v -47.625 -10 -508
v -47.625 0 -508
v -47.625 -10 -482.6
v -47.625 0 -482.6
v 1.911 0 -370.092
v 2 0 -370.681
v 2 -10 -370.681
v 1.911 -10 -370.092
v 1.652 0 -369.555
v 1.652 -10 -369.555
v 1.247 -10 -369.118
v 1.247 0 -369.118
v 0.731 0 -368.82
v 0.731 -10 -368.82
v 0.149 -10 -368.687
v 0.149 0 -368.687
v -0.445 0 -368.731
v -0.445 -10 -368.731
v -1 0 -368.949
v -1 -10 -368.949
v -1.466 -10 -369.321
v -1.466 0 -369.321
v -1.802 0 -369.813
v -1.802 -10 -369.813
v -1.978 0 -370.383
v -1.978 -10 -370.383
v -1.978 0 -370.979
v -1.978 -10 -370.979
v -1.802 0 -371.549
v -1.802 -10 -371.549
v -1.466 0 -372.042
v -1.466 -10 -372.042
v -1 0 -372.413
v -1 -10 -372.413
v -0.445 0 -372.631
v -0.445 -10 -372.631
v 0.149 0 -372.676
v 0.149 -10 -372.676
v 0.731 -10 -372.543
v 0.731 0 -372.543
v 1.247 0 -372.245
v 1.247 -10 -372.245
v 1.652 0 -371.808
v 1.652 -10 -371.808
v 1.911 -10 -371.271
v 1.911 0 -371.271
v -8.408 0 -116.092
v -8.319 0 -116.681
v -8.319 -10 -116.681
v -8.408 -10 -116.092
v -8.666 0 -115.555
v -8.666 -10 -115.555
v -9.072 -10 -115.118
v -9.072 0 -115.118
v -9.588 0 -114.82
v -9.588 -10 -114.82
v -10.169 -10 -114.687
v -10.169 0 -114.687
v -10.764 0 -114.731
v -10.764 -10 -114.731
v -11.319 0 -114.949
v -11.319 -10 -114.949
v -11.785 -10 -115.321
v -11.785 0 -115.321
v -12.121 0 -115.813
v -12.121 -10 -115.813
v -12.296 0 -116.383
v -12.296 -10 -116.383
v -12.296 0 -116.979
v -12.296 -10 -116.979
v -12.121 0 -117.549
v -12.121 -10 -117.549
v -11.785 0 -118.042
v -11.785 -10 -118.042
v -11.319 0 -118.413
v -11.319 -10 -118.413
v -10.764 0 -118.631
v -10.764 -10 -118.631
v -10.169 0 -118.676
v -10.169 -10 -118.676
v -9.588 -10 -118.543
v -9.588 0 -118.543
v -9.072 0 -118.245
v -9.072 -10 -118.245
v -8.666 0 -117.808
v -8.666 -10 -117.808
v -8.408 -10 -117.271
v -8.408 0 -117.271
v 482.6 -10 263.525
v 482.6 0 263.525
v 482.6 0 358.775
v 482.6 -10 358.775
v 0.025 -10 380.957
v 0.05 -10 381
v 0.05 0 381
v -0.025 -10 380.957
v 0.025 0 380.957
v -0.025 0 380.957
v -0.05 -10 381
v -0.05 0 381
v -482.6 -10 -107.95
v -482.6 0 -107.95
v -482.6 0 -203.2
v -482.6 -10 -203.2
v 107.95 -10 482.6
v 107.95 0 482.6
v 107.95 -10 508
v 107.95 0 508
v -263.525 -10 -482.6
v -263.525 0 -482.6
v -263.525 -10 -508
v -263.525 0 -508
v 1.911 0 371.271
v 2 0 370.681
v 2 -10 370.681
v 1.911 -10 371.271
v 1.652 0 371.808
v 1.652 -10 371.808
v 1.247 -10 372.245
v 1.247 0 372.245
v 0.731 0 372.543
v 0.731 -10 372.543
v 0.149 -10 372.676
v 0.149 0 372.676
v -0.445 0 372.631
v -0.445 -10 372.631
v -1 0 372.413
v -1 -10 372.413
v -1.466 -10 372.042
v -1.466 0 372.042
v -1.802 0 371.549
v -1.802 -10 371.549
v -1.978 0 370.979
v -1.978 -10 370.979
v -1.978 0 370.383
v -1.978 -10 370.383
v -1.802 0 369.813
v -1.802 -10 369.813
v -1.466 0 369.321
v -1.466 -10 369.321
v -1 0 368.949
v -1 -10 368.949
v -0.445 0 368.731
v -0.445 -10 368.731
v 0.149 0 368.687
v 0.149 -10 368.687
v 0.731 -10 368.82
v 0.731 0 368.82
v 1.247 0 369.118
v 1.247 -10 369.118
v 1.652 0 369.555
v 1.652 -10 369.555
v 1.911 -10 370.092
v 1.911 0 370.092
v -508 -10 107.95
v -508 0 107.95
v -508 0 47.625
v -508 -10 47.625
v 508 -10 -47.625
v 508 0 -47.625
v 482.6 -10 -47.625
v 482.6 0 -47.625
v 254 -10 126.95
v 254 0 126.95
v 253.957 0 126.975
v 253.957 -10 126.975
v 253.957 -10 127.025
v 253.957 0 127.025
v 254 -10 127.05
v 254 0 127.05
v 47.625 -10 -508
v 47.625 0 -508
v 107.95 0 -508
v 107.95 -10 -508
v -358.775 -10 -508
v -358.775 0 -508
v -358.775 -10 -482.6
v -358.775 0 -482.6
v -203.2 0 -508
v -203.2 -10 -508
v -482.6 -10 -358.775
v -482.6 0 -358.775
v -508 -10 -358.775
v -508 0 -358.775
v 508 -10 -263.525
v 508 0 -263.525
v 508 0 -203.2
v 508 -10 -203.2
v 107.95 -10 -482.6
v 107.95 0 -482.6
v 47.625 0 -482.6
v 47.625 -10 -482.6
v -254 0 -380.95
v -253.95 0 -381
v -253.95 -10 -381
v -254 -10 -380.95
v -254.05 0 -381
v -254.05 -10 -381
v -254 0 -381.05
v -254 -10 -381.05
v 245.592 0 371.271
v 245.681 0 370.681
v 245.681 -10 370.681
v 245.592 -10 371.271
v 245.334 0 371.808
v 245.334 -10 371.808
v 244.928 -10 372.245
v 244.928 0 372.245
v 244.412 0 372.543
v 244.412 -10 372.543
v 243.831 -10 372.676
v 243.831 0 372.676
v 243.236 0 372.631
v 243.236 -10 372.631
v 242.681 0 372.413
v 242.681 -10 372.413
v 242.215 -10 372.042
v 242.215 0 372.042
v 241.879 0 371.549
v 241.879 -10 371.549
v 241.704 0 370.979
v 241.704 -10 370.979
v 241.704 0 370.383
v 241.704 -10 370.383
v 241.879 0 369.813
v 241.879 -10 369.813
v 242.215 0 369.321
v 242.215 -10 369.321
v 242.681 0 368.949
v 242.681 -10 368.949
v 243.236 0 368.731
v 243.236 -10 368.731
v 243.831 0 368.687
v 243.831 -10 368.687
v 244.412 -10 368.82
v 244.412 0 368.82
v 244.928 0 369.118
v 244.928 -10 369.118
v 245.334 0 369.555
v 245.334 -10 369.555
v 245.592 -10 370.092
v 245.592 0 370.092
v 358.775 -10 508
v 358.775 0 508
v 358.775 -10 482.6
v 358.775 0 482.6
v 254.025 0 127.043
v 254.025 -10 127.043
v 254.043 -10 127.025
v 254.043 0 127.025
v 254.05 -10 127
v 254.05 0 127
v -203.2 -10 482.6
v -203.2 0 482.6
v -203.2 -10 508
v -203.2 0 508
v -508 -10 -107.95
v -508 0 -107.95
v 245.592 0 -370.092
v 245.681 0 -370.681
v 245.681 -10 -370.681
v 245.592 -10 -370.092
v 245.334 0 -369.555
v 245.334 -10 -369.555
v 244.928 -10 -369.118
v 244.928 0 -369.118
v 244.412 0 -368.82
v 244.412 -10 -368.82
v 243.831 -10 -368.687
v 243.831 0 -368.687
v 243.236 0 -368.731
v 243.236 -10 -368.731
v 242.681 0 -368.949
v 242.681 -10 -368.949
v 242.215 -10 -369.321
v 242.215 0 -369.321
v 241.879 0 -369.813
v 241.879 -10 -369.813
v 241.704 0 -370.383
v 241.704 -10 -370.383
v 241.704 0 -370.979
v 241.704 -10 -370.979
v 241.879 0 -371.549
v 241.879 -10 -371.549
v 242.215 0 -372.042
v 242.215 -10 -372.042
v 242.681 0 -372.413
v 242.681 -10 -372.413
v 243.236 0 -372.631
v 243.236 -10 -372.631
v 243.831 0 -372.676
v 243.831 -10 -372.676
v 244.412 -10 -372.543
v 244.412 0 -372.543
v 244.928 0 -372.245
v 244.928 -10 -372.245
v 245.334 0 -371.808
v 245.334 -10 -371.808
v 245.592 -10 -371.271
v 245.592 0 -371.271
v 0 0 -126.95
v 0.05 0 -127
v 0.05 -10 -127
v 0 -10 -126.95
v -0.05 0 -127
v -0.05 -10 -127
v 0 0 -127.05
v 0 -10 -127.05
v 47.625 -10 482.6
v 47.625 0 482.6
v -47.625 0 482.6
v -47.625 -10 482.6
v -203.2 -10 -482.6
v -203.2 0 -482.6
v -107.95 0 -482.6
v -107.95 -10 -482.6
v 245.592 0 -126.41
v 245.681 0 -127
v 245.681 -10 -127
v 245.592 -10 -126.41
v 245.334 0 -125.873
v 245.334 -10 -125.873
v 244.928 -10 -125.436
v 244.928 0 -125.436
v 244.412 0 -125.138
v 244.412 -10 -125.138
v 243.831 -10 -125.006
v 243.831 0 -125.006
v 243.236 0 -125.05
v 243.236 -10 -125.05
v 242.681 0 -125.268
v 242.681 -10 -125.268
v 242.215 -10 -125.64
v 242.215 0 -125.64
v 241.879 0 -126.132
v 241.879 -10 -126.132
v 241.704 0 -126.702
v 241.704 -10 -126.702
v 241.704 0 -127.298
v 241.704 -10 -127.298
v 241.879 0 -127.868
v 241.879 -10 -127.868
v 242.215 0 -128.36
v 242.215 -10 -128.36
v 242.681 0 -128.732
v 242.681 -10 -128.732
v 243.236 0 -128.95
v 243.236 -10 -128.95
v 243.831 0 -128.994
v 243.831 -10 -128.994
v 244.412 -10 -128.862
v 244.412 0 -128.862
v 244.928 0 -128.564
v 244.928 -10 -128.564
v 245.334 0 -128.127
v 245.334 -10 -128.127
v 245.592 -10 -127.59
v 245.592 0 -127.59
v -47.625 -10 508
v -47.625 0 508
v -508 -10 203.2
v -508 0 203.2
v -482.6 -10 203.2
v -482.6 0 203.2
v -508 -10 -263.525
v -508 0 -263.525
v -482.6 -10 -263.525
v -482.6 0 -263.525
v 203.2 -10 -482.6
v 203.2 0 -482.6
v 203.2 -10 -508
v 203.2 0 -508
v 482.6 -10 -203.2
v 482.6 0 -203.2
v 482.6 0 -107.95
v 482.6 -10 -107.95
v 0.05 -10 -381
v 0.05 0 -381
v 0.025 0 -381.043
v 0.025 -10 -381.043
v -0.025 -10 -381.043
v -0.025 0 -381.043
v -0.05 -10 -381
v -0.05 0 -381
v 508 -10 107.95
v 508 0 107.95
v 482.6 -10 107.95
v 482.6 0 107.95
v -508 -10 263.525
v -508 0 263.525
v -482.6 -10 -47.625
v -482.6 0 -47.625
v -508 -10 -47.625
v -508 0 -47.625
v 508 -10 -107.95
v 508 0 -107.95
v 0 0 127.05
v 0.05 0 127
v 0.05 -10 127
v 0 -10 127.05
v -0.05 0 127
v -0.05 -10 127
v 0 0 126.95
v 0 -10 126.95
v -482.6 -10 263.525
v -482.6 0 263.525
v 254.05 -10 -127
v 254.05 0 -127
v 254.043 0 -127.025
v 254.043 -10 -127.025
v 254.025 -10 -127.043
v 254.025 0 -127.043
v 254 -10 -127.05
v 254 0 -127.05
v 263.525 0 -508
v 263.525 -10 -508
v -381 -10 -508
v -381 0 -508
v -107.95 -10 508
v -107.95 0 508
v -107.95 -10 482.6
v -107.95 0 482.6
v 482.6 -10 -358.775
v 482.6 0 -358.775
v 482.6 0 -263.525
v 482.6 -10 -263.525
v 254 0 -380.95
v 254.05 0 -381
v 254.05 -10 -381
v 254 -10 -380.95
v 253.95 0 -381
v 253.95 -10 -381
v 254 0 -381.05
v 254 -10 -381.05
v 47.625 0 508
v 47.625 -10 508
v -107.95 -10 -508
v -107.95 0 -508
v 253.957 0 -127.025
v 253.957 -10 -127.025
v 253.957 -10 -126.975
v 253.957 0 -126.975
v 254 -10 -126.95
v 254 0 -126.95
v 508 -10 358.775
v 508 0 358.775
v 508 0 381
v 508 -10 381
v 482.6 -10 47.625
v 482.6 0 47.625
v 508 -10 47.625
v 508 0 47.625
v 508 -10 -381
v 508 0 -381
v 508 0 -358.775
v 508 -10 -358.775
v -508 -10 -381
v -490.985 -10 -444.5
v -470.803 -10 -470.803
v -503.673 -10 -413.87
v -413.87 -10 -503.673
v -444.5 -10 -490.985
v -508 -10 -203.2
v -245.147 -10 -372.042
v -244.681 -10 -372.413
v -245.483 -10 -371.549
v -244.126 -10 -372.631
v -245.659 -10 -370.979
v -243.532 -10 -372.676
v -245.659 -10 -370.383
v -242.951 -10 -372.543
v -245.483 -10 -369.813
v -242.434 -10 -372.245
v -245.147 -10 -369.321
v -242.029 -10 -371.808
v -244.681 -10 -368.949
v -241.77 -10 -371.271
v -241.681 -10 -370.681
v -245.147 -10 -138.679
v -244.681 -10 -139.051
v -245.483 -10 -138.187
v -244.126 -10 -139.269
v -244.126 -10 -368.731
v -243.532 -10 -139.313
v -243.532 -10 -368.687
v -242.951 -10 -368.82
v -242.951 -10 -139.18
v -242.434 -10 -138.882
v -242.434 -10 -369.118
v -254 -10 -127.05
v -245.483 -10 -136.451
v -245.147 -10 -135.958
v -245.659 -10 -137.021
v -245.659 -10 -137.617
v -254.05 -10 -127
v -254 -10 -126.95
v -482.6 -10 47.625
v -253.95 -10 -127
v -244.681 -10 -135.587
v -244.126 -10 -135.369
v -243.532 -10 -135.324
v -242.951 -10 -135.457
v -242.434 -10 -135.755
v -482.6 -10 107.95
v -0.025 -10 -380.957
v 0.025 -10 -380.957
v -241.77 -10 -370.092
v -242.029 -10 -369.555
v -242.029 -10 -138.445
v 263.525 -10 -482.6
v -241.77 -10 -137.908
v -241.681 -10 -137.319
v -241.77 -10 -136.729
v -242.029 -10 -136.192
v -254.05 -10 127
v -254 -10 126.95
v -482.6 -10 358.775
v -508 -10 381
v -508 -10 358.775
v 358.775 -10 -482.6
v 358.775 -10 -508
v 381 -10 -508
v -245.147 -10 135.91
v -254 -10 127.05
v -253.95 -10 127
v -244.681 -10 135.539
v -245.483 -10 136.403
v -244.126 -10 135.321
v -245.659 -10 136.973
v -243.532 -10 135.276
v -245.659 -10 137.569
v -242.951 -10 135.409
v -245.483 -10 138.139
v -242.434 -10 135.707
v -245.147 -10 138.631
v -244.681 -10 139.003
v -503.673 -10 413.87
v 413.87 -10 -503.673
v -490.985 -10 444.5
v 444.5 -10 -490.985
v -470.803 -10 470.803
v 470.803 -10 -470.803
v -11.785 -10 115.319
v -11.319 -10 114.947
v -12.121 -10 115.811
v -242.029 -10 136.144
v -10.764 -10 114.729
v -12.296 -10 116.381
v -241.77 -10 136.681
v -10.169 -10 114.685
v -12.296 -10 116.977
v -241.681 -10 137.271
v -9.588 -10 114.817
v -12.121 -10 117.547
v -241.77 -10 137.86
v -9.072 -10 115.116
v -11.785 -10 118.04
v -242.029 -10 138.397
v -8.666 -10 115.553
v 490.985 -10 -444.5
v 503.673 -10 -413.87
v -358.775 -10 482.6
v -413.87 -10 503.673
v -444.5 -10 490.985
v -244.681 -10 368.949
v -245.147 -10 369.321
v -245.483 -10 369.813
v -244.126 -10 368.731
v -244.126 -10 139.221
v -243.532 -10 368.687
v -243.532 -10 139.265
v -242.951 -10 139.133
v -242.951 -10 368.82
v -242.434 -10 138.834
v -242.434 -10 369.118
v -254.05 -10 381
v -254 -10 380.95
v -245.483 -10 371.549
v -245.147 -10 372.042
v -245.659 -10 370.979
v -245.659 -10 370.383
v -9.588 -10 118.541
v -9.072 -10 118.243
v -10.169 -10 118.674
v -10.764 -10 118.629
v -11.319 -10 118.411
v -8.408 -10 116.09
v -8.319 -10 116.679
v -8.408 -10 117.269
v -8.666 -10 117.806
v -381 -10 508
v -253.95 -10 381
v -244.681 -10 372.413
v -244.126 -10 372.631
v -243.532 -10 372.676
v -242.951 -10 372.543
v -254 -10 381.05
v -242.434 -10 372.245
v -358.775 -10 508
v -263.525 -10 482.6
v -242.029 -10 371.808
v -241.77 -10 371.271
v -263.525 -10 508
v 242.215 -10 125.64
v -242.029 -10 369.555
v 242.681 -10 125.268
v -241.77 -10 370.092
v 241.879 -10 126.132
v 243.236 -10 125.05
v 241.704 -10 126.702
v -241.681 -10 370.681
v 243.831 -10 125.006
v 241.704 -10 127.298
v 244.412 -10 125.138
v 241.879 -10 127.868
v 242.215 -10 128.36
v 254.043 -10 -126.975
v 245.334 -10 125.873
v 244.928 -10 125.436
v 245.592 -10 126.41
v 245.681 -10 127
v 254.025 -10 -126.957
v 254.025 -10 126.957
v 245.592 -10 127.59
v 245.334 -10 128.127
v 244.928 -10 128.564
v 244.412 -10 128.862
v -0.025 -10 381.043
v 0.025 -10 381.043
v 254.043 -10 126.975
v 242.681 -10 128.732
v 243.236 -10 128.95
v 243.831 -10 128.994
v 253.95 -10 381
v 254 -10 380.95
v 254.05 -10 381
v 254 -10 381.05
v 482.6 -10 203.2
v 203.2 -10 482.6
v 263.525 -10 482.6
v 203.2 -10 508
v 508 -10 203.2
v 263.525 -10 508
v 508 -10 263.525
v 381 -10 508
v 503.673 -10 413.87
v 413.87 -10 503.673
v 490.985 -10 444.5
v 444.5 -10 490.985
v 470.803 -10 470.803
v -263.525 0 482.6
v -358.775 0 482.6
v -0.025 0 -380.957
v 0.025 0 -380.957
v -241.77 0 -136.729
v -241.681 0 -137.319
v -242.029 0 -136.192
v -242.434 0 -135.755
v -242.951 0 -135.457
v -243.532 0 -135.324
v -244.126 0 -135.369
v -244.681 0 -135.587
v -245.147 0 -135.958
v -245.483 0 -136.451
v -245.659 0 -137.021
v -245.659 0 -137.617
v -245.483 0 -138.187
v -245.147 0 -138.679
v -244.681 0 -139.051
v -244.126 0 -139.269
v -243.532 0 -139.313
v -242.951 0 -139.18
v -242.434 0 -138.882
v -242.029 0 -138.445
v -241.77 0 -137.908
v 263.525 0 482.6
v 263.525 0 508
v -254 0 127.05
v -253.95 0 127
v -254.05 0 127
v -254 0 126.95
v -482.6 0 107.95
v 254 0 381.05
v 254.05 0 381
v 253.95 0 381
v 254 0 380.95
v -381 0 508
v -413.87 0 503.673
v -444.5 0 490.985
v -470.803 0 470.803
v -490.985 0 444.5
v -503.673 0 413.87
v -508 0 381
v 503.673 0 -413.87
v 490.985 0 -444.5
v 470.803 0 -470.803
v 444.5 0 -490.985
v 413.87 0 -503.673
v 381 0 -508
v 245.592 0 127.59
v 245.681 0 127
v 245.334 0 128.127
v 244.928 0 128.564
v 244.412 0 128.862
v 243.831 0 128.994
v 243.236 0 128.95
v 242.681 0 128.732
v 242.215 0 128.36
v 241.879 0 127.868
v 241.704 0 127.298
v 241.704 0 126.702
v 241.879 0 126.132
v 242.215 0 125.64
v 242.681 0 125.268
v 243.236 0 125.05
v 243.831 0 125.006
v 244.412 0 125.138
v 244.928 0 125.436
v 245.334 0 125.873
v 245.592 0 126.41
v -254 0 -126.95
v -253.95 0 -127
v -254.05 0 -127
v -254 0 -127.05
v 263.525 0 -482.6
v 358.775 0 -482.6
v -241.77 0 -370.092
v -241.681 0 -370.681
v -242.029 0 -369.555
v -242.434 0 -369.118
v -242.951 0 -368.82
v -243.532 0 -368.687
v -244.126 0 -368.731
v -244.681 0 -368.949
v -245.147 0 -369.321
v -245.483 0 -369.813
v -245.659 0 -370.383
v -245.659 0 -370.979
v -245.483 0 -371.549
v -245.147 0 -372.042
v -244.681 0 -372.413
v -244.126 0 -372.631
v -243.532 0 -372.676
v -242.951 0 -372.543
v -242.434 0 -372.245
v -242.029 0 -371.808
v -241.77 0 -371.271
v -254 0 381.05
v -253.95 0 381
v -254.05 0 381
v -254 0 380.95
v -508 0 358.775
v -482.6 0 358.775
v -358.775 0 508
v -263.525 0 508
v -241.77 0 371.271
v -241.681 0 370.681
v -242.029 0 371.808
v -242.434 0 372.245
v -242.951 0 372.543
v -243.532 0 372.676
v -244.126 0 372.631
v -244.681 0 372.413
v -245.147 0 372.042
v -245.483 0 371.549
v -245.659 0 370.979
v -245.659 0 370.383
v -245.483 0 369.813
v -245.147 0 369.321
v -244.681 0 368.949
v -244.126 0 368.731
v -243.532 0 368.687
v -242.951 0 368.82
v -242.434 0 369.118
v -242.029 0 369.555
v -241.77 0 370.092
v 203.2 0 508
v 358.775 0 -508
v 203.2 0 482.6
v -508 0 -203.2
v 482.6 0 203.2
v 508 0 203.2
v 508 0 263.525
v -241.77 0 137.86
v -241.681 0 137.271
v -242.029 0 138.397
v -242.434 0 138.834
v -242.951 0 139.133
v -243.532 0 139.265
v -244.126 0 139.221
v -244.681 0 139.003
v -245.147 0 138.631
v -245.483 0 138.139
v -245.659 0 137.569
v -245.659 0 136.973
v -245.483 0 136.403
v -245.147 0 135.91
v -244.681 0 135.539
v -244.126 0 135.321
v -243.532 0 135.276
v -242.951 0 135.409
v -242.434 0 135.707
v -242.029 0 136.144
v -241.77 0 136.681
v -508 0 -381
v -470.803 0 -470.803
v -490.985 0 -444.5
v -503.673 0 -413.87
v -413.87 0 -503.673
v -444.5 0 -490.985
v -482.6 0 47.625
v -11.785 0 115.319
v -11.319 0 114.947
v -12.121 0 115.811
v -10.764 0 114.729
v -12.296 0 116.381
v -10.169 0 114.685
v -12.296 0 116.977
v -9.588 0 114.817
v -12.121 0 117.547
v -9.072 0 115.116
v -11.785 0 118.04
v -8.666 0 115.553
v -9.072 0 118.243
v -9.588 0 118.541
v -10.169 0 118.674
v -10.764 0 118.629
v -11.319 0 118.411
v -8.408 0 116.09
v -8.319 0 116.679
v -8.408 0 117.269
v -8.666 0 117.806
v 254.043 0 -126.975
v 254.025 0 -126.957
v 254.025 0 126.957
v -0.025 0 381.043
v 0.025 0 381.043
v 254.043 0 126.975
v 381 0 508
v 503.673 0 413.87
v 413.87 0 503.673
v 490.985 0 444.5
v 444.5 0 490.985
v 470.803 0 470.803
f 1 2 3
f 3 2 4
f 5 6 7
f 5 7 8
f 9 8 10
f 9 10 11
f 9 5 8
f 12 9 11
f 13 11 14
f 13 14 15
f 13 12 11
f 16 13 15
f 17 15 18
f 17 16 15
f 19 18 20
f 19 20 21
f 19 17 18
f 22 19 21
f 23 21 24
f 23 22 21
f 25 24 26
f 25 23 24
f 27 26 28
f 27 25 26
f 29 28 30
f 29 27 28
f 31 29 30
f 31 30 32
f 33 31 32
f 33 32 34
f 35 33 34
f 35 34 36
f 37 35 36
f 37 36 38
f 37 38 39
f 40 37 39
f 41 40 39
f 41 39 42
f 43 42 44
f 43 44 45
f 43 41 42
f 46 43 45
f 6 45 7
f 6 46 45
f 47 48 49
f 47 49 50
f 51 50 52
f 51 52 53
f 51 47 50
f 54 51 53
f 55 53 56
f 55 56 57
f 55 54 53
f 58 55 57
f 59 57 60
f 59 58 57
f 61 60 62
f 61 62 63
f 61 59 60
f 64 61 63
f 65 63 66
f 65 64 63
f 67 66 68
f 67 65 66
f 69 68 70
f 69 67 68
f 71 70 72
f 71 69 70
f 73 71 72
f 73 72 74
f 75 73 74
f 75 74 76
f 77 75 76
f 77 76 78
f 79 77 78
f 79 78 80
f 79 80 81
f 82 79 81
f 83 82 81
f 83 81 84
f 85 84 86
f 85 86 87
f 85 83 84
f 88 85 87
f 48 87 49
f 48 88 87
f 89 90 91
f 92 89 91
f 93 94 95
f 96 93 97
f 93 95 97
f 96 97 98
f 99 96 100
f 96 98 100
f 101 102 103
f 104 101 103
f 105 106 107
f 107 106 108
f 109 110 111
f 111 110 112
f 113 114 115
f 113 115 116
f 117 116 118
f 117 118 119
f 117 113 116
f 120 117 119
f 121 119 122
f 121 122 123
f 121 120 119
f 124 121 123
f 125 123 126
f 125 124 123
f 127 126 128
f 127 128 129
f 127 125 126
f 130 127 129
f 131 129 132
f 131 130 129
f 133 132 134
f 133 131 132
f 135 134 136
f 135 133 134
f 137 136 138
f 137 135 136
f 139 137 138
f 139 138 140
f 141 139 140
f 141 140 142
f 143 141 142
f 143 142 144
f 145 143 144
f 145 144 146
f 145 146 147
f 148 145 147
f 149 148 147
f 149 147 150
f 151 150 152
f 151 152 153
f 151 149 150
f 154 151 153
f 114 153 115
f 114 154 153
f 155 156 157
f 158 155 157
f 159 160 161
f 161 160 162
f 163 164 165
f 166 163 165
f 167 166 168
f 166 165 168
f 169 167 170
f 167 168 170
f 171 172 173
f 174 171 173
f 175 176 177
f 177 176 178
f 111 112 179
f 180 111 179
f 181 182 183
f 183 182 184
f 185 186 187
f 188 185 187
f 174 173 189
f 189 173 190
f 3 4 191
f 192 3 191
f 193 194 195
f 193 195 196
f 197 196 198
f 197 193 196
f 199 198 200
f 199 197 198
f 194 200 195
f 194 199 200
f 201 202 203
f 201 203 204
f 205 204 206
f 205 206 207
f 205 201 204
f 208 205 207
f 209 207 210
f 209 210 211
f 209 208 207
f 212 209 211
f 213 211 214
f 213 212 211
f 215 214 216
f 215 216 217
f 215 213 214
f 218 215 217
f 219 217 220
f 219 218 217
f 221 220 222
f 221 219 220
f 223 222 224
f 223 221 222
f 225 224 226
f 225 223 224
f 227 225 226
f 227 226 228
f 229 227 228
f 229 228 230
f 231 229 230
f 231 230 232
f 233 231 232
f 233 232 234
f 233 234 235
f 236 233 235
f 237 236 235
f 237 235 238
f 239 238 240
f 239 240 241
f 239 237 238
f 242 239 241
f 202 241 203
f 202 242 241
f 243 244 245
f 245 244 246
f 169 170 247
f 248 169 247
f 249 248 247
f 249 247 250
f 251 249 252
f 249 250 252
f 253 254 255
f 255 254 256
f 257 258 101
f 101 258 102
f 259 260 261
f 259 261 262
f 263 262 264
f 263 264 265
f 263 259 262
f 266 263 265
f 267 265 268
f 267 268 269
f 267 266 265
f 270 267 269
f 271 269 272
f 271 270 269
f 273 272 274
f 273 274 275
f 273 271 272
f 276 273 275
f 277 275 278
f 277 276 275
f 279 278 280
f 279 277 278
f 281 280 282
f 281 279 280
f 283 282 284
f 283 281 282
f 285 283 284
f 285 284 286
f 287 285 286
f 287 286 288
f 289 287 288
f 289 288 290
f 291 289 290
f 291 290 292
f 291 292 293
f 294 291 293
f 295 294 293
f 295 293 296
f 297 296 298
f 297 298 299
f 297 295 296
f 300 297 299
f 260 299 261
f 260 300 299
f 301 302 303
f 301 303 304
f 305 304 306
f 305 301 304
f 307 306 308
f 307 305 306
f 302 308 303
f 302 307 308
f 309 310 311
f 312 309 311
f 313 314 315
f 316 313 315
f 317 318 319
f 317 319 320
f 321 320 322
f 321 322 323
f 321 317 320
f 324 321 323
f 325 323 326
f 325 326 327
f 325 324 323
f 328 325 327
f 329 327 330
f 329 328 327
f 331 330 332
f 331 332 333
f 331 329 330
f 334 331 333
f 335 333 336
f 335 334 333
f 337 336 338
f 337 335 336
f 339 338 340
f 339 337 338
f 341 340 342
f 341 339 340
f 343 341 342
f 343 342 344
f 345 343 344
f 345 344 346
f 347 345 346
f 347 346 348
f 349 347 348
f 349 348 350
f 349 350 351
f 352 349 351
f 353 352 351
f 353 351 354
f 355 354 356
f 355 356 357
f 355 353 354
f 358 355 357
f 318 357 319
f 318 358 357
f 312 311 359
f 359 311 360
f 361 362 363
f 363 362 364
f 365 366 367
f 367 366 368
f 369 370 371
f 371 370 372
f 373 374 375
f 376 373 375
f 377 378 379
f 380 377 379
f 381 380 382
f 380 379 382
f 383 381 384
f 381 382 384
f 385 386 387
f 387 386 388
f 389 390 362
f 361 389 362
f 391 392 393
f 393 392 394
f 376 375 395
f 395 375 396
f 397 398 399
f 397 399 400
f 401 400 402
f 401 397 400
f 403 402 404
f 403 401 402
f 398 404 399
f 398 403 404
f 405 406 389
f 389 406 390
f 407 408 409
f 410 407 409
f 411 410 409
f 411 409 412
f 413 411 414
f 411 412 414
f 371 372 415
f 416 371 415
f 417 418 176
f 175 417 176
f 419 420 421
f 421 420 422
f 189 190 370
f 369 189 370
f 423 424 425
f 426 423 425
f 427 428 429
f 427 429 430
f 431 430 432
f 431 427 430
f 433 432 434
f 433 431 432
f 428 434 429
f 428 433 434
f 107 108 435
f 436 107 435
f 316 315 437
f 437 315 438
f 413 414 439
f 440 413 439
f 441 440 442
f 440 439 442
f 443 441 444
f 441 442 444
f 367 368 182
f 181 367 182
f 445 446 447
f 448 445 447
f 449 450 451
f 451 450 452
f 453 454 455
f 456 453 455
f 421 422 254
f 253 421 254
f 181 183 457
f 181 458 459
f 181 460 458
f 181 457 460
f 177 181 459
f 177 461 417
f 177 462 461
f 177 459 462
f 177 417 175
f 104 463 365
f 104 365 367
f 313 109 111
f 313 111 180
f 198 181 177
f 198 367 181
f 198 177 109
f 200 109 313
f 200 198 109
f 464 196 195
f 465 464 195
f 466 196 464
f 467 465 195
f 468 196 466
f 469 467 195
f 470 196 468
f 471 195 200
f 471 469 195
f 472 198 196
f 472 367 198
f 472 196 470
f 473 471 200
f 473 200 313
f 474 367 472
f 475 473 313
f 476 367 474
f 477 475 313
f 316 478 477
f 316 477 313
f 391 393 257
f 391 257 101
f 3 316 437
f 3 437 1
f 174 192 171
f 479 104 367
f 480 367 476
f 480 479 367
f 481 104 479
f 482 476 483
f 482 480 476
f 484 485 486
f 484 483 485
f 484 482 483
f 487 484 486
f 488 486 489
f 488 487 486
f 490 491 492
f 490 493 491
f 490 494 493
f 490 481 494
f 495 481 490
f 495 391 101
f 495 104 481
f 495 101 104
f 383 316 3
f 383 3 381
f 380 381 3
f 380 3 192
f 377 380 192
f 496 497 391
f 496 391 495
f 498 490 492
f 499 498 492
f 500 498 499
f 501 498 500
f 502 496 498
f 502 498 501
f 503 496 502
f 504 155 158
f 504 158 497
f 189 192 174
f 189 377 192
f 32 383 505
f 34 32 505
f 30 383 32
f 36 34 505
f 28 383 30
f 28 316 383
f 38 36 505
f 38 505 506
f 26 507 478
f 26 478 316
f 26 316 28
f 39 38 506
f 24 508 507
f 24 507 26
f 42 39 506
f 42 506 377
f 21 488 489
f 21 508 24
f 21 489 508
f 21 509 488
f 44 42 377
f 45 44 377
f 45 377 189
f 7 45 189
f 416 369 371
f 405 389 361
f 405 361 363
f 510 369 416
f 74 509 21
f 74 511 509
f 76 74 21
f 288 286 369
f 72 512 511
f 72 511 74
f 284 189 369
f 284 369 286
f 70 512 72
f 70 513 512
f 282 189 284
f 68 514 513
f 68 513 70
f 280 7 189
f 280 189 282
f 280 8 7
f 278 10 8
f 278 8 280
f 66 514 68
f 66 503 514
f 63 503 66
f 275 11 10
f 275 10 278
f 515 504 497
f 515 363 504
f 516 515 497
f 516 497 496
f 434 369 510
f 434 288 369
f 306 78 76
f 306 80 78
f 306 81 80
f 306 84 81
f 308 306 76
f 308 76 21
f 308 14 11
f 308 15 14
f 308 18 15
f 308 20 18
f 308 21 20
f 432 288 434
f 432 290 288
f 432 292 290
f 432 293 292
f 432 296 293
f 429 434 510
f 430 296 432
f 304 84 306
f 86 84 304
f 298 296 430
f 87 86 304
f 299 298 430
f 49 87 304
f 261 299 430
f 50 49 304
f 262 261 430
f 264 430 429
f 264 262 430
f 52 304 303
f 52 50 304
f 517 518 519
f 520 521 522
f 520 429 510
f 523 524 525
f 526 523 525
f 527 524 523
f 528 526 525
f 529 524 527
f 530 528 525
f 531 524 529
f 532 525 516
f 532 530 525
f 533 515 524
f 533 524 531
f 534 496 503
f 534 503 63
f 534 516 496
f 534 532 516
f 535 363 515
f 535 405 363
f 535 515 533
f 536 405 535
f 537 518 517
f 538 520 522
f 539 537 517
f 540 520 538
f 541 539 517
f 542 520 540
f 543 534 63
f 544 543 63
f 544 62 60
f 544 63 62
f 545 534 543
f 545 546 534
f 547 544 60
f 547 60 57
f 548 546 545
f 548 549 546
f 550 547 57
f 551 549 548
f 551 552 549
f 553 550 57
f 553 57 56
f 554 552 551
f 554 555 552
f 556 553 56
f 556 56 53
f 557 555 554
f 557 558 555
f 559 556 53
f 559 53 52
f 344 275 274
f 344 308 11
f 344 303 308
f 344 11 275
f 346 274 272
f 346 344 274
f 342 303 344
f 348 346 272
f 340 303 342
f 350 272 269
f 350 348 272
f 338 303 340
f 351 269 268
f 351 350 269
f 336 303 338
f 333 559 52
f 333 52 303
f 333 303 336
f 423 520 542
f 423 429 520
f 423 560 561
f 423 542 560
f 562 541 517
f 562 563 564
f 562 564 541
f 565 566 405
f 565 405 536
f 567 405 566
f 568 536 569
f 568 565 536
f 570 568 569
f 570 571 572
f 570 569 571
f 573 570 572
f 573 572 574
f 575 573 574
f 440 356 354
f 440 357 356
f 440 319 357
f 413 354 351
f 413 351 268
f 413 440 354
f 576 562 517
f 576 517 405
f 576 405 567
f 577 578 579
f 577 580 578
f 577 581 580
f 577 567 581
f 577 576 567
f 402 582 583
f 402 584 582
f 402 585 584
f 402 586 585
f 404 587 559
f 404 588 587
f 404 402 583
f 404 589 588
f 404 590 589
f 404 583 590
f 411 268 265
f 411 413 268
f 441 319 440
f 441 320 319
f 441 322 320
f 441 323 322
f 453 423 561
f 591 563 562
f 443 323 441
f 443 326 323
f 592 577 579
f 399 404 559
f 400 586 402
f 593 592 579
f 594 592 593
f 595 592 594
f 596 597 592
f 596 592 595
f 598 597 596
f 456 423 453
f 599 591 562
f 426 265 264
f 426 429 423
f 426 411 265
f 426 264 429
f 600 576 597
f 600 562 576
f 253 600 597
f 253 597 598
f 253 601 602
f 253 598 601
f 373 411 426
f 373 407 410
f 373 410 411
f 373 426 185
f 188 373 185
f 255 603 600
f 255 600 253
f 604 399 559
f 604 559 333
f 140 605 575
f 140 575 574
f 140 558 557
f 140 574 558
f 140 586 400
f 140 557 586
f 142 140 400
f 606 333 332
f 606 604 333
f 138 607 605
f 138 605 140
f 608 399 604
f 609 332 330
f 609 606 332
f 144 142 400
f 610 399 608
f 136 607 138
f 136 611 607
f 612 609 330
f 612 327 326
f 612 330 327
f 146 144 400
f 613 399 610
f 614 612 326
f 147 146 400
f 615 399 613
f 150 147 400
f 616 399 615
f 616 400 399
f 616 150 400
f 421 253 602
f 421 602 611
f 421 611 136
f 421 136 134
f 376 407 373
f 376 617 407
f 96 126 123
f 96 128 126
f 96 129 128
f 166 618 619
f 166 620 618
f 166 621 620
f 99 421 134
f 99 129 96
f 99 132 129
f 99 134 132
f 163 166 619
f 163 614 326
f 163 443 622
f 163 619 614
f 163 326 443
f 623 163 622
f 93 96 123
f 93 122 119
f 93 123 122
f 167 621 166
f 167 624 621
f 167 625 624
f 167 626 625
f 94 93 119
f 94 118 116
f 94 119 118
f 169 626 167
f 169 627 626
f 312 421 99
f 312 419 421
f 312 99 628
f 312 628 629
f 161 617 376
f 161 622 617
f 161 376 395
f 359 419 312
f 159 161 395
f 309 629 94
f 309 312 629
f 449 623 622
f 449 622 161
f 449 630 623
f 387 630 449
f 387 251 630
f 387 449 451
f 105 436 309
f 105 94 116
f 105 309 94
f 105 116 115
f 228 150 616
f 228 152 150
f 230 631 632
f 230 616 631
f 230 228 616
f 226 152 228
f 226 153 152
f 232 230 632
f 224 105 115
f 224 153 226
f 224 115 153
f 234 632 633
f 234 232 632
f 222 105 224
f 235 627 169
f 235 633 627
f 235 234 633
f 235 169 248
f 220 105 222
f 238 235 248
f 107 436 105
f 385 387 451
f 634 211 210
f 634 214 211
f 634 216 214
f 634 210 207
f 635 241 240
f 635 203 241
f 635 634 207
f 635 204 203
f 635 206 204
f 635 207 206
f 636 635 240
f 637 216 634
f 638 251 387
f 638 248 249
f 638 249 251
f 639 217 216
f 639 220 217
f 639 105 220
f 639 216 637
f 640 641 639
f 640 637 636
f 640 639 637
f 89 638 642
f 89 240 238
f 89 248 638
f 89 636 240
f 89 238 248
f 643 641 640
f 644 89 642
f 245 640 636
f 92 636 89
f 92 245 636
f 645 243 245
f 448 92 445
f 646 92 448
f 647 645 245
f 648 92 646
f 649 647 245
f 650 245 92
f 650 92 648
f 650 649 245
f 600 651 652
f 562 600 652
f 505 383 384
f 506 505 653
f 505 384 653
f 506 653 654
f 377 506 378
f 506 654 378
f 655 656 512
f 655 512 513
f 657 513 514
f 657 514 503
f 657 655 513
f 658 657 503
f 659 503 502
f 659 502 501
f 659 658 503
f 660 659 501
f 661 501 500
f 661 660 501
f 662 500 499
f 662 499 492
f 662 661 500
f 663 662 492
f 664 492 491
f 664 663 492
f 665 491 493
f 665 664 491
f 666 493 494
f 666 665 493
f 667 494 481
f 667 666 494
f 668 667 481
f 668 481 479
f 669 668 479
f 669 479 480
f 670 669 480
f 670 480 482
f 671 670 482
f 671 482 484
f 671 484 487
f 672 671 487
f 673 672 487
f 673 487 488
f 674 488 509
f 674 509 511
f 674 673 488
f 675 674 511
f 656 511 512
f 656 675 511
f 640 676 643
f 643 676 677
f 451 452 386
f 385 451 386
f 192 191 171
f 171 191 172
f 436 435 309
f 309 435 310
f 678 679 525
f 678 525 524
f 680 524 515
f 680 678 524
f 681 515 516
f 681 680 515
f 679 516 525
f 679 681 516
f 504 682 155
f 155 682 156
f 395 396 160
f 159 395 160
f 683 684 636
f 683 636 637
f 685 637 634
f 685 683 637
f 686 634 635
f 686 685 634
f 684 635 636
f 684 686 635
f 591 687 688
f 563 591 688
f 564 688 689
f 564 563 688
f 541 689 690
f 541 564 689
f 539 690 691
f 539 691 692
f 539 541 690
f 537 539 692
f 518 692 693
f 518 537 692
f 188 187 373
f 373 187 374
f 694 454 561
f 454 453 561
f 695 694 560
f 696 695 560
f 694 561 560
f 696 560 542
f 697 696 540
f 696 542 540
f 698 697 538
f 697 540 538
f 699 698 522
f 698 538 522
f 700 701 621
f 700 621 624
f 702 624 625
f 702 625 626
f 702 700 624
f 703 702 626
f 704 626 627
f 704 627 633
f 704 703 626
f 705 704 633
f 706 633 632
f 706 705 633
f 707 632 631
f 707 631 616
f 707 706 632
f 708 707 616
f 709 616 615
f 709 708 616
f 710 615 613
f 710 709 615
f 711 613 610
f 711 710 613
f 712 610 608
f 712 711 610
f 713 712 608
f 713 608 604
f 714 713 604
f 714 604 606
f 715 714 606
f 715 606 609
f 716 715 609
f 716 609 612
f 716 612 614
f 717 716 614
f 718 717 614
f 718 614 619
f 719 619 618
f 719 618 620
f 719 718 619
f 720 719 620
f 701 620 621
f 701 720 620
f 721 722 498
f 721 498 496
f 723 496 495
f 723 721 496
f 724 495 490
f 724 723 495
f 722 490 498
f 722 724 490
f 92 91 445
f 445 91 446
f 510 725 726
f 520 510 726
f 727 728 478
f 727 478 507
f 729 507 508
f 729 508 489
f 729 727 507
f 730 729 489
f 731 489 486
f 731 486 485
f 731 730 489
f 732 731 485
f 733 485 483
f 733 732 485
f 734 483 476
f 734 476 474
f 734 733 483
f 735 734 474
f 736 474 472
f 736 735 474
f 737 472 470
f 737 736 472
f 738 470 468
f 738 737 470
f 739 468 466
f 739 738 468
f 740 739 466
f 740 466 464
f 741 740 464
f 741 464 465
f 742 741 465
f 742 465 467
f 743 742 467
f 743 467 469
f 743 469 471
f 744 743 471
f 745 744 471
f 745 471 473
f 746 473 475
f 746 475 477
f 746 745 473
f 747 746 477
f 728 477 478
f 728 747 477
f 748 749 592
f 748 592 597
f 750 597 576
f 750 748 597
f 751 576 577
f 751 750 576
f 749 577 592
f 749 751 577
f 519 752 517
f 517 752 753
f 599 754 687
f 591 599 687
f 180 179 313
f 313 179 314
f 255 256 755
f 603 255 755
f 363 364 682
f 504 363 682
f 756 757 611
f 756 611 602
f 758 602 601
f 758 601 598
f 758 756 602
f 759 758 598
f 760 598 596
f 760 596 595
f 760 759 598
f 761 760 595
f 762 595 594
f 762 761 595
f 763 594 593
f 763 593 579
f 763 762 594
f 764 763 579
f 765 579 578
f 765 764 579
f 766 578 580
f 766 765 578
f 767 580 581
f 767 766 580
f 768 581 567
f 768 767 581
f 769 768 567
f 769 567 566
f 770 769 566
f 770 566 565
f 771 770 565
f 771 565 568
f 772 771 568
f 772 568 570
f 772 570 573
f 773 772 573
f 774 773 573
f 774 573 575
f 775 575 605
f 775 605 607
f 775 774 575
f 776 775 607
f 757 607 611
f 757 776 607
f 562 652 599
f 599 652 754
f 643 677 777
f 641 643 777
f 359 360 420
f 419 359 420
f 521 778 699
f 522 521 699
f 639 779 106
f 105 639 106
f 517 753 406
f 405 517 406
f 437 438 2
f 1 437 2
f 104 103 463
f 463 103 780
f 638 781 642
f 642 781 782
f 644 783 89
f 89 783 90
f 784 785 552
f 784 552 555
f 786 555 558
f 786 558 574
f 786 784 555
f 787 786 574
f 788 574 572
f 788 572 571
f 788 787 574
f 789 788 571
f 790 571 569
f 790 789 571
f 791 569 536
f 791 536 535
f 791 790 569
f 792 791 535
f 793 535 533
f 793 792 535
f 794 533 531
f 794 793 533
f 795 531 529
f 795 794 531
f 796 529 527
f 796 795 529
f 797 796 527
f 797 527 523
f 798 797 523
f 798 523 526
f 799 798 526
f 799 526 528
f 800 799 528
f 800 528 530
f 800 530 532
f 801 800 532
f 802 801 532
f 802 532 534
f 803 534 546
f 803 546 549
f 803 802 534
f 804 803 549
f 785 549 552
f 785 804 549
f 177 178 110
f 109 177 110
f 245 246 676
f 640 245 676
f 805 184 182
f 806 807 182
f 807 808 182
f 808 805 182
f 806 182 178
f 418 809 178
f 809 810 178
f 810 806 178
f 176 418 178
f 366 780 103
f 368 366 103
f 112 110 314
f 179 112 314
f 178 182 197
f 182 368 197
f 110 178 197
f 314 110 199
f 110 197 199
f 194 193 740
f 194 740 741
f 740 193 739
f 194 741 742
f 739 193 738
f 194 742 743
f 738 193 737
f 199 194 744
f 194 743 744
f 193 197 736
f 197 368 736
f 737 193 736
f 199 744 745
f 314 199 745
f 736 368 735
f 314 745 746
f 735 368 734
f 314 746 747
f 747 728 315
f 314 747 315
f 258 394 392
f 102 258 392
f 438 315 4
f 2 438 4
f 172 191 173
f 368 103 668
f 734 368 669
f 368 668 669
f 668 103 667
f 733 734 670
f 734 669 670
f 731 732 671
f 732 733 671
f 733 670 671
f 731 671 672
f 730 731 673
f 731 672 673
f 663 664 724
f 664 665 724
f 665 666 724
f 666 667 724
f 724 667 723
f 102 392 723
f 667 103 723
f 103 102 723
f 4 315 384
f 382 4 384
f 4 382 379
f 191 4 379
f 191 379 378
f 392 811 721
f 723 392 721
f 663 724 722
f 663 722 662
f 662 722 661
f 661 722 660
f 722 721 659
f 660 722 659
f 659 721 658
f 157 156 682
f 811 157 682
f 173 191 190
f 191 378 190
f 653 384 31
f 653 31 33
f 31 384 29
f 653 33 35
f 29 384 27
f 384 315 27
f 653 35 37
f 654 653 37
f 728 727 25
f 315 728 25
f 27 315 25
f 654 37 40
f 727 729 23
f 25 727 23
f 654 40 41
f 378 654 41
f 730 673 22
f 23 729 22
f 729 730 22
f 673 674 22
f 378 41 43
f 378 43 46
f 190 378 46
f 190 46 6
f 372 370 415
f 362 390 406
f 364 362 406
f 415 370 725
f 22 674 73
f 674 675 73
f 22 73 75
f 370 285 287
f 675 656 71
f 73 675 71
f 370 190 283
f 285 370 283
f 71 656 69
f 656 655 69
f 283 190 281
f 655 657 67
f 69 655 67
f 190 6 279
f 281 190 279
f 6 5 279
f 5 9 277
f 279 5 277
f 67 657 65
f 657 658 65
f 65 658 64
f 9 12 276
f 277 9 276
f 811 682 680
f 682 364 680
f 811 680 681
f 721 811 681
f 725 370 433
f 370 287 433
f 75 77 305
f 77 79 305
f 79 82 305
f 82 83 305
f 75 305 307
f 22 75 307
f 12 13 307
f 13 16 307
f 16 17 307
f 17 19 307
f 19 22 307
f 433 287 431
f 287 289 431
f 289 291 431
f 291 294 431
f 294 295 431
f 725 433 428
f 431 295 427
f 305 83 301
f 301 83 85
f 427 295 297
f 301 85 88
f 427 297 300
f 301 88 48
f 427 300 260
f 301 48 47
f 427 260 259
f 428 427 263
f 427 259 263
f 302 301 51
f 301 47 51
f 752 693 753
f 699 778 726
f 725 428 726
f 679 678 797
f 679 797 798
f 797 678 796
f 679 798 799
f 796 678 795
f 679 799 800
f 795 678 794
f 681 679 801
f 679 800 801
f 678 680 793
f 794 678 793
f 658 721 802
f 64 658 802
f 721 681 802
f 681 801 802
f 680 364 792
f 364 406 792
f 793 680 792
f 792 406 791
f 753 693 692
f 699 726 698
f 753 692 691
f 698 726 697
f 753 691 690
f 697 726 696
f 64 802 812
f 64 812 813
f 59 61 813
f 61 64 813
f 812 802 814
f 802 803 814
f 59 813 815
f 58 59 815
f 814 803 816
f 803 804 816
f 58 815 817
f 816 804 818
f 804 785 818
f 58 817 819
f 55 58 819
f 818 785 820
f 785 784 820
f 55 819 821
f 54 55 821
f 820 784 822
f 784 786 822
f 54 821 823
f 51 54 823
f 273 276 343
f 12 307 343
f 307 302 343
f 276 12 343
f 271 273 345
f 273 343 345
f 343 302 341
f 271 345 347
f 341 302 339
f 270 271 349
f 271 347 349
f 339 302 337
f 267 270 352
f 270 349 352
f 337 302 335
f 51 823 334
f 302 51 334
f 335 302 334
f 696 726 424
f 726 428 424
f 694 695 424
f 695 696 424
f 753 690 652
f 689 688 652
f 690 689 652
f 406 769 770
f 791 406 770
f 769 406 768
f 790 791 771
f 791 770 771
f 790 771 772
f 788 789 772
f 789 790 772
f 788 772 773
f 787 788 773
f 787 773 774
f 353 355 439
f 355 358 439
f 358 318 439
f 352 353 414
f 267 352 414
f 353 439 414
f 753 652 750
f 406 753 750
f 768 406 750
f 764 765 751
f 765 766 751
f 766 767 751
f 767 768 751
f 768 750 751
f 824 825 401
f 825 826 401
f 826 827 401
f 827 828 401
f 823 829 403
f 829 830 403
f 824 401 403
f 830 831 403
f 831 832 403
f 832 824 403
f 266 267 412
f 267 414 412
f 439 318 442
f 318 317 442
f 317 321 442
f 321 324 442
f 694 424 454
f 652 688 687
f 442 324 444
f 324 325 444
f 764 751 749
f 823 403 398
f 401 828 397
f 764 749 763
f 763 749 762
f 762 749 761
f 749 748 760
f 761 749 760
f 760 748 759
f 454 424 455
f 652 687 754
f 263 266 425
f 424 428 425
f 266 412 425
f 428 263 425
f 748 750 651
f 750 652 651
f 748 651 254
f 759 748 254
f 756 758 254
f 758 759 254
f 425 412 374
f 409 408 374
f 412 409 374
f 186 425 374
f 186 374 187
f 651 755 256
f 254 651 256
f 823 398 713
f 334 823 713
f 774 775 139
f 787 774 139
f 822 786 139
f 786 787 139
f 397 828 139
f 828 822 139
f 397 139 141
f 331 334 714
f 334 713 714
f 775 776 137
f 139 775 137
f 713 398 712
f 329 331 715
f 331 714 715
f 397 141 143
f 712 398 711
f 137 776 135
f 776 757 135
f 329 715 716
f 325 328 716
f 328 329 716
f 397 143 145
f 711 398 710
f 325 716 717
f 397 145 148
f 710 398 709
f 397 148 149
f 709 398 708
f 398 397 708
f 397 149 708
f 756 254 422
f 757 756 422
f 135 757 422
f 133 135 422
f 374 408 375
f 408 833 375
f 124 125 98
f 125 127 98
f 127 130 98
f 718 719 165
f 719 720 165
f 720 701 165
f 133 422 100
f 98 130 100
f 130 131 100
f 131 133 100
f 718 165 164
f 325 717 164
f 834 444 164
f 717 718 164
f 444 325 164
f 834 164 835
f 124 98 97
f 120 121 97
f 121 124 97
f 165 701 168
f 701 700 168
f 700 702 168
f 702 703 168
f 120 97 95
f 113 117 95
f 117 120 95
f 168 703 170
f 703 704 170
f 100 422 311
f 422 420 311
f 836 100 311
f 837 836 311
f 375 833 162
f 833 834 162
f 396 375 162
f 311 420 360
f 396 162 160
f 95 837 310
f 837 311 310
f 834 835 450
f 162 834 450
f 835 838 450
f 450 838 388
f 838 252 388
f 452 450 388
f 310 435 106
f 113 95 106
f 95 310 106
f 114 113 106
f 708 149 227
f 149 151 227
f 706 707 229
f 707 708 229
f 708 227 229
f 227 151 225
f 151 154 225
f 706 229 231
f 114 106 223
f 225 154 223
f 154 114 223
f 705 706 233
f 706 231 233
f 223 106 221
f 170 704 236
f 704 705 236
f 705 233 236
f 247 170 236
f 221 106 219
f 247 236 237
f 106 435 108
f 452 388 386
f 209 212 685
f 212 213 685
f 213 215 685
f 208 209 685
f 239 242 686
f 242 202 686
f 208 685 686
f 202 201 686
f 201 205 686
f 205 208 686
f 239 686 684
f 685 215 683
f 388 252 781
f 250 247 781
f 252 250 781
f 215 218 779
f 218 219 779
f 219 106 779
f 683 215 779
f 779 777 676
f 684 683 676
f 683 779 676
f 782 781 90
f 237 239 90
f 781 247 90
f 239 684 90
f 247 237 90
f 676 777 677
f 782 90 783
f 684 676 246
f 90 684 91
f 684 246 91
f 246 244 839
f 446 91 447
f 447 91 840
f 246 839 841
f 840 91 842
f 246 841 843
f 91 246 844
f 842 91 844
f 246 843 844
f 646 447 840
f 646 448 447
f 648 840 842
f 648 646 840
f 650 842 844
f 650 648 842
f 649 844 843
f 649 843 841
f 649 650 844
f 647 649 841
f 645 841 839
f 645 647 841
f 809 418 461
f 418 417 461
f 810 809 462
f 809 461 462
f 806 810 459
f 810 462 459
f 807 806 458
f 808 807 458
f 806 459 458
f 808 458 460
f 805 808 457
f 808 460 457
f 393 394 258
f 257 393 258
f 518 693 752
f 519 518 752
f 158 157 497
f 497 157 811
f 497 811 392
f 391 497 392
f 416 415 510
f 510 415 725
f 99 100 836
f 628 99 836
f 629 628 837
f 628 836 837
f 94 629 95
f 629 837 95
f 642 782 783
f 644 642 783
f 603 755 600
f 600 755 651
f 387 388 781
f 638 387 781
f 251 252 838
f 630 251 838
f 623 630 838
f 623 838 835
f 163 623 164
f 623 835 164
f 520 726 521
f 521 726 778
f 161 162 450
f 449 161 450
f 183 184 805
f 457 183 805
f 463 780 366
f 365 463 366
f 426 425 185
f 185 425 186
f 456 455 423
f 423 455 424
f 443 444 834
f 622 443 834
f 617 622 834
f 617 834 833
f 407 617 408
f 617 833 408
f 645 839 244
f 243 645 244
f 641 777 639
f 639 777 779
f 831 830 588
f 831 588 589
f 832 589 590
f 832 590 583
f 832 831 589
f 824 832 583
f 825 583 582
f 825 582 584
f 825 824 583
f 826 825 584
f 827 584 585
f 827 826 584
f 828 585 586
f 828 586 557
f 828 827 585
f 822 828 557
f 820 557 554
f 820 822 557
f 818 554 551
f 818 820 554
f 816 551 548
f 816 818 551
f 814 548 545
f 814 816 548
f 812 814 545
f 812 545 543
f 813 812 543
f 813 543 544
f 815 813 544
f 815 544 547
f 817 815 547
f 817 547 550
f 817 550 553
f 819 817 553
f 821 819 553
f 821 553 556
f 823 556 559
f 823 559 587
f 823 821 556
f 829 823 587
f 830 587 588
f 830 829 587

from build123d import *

# Parameters (mm, degrees)
F0_R     = 0.05
F0_R_2   = 10.31875
F0_R_3   = 2
F1_DEPTH = 10
F2_R     = 127


with BuildPart() as f1:
    # F0 (on Front) → F1 (new body)
    with BuildSketch(Plane.XZ):
        Polygon((508, 358.775), (508, 508), (358.775, 508), (358.775, 482.6), (263.525, 482.6), (263.525, 508), (203.2, 508), (203.2, 482.6), (107.95, 482.6), (107.95, 508), (47.625, 508), (47.625, 482.6), (-47.625, 482.6), (-47.625, 508), (-107.95, 508), (-107.95, 482.6), (-203.2, 482.6), (-203.2, 508), (-263.525, 508), (-263.525, 482.6), (-358.775, 482.6), (-358.775, 508), (-508, 508), (-508, 358.775), (-482.6, 358.775), (-482.6, 263.525), (-508, 263.525), (-508, 203.2), (-482.6, 203.2), (-482.6, 107.95), (-508, 107.95), (-508, 47.625), (-482.6, 47.625), (-482.6, -47.625), (-508, -47.625), (-508, -107.95), (-482.6, -107.95), (-482.6, -203.2), (-508, -203.2), (-508, -263.525), (-482.6, -263.525), (-482.6, -358.775), (-508, -358.775), (-508, -508), (-358.775, -508), (-358.775, -482.6), (-263.525, -482.6), (-263.525, -508), (-203.2, -508), (-203.2, -482.6), (-107.95, -482.6), (-107.95, -508), (-47.625, -508), (-47.625, -482.6), (47.625, -482.6), (47.625, -508), (107.95, -508), (107.95, -482.6), (203.2, -482.6), (203.2, -508), (263.525, -508), (263.525, -482.6), (358.775, -482.6), (358.775, -508), (508, -508), (508, -358.775), (482.6, -358.775), (482.6, -263.525), (508, -263.525), (508, -203.2), (482.6, -203.2), (482.6, -107.95), (508, -107.95), (508, -47.625), (482.6, -47.625), (482.6, 47.625), (508, 47.625), (508, 107.95), (482.6, 107.95), (482.6, 203.2), (508, 203.2), (508, 263.525), (482.6, 263.525), (482.6, 358.775), align=None)
        with Locations((-254, -381)):
            Circle(F0_R, mode=Mode.SUBTRACT)
        with Locations((-243.68125, -370.68125)):
            Circle(F0_R_2, mode=Mode.SUBTRACT)
        with Locations((-243.68125, -137.31875)):
            Circle(F0_R_2, mode=Mode.SUBTRACT)
        with Locations((-254, -127)):
            Circle(F0_R, mode=Mode.SUBTRACT)
        with Locations((-10.31875, -116.68125)):
            Circle(F0_R_2, mode=Mode.SUBTRACT)
        with BuildLine():
            ThreePointArc((0.0499998533, -380.9998788613), (0.0499999633, -380.9999394306), (0.05, -381))
            ThreePointArc((0.05, -381), (-6.05694e-05, -381.0499999633), (-0.0499998533, -380.9998788613))
            ThreePointArc((-0.0499998533, -380.9998788613), (-7.2787590143, -363.3671356466), (10.31875, -370.68125))
            ThreePointArc((10.31875, -370.68125), (7.3141143534, -377.9600090143), (0.0499998533, -380.9998788613))
        make_face(mode=Mode.SUBTRACT)
        with Locations((243.68125, -370.68125)):
            Circle(F0_R_2, mode=Mode.SUBTRACT)
        with Locations((254, -381)):
            Circle(F0_R, mode=Mode.SUBTRACT)
        with Locations((0, -127)):
            Circle(F0_R, mode=Mode.SUBTRACT)
        with BuildLine():
            ThreePointArc((253.9998788613, -126.9500001467), (254.0353124841, -126.9646018579), (254.05, -127))
            ThreePointArc((254.05, -127), (254.0353124841, -127.0353981421), (253.9998788613, -127.0499998533))
            ThreePointArc((253.9998788613, -127.0499998533), (233.3625, -127), (253.9998788613, -126.9500001467))
        make_face(mode=Mode.SUBTRACT)
        with Locations((-10.31875, 116.6792185501)):
            Circle(F0_R_2, mode=Mode.SUBTRACT)
        with Locations((-254, 127)):
            Circle(F0_R, mode=Mode.SUBTRACT)
        with Locations((-243.68125, 137.2707814499)):
            Circle(F0_R_2, mode=Mode.SUBTRACT)
        with Locations((-243.68125, 370.68125)):
            Circle(F0_R_2, mode=Mode.SUBTRACT)
        with Locations((-254, 381)):
            Circle(F0_R, mode=Mode.SUBTRACT)
        with Locations((0, 127)):
            Circle(F0_R, mode=Mode.SUBTRACT)
        with BuildLine():
            ThreePointArc((253.9998788613, 127.0499998533), (254.0353124841, 127.0353981421), (254.05, 127))
            ThreePointArc((254.05, 127), (254.0353124841, 126.9646018579), (253.9998788613, 126.9500001467))
            ThreePointArc((253.9998788613, 126.9500001467), (233.3625, 127), (253.9998788613, 127.0499998533))
        make_face(mode=Mode.SUBTRACT)
        with BuildLine():
            ThreePointArc((-0.0499998533, 380.9998788613), (-6.05694e-05, 381.0499999633), (0.05, 381))
            ThreePointArc((0.05, 381), (0.0499999633, 380.9999394306), (0.0499998533, 380.9998788613))
            ThreePointArc((0.0499998533, 380.9998788613), (7.3141143534, 377.9600090143), (10.31875, 370.68125))
            ThreePointArc((10.31875, 370.68125), (-7.2787590143, 363.3671356466), (-0.0499998533, 380.9998788613))
        make_face(mode=Mode.SUBTRACT)
        with Locations((243.68125, 370.68125)):
            Circle(F0_R_2, mode=Mode.SUBTRACT)
        with Locations((254, 381)):
            Circle(F0_R, mode=Mode.SUBTRACT)
        with Locations((-243.68125, 370.68125)):
            Circle(F0_R_2)
        with Locations((-243.68125, 370.68125)):
            Circle(F0_R_3, mode=Mode.SUBTRACT)
        with BuildLine():
            ThreePointArc((0.0499998533, 380.9998788613), (0, 380.95), (-0.0499998533, 380.9998788613))
            ThreePointArc((-0.0499998533, 380.9998788613), (-7.2787590143, 363.3671356466), (10.31875, 370.68125))
            ThreePointArc((10.31875, 370.68125), (7.3141143534, 377.9600090143), (0.0499998533, 380.9998788613))
        make_face()
        with Locations((0, 370.68125)):
            Circle(F0_R_3, mode=Mode.SUBTRACT)
        with Locations((243.68125, 370.68125)):
            Circle(F0_R_2)
        with Locations((243.68125, 370.68125)):
            Circle(F0_R_3, mode=Mode.SUBTRACT)
        with Locations((-243.68125, 137.2707814499)):
            Circle(F0_R_2)
        with Locations((-243.68125, 137.2707814499)):
            Circle(F0_R_3, mode=Mode.SUBTRACT)
        with Locations((-10.31875, 116.6792185501)):
            Circle(F0_R_2)
        with Locations((-10.31875, 116.6792185501)):
            Circle(F0_R_3, mode=Mode.SUBTRACT)
        with BuildLine():
            ThreePointArc((253.9998788613, 126.9500001467), (253.95, 127), (253.9998788613, 127.0499998533))
            ThreePointArc((253.9998788613, 127.0499998533), (233.3625, 127), (253.9998788613, 126.9500001467))
        make_face()
        with Locations((243.68125, 127)):
            Circle(F0_R_3, mode=Mode.SUBTRACT)
        with Locations((-243.68125, -137.31875)):
            Circle(F0_R_2)
        with Locations((-243.68125, -137.31875)):
            Circle(F0_R_3, mode=Mode.SUBTRACT)
        with Locations((-10.31875, -116.68125)):
            Circle(F0_R_2)
        with Locations((-10.31875, -116.68125)):
            Circle(F0_R_3, mode=Mode.SUBTRACT)
        with BuildLine():
            ThreePointArc((253.9998788613, -127.0499998533), (253.95, -127), (253.9998788613, -126.9500001467))
            ThreePointArc((253.9998788613, -126.9500001467), (233.3625, -127), (253.9998788613, -127.0499998533))
        make_face()
        with Locations((243.68125, -127)):
            Circle(F0_R_3, mode=Mode.SUBTRACT)
        with Locations((243.68125, -370.68125)):
            Circle(F0_R_2)
        with Locations((243.68125, -370.68125)):
            Circle(F0_R_3, mode=Mode.SUBTRACT)
        with BuildLine():
            ThreePointArc((-0.0499998533, -380.9998788613), (0, -380.95), (0.0499998533, -380.9998788613))
            ThreePointArc((0.0499998533, -380.9998788613), (7.3141143534, -377.9600090143), (10.31875, -370.68125))
            ThreePointArc((10.31875, -370.68125), (-7.2787590143, -363.3671356466), (-0.0499998533, -380.9998788613))
        make_face()
        with Locations((0, -370.68125)):
            Circle(F0_R_3, mode=Mode.SUBTRACT)
        with Locations((-243.68125, -370.68125)):
            Circle(F0_R_2)
        with Locations((-243.68125, -370.68125)):
            Circle(F0_R_3, mode=Mode.SUBTRACT)
    extrude(amount=F1_DEPTH)

    # F2
    f2_edges = [f1.edges().sort_by_distance(p)[0] for p in [
        (-508, -5, 508),
        (508, -5, 508),
        (508, -5, -508),
        (-508, -5, -508),
    ]]
    fillet(f2_edges, radius=F2_R)


solid = f1.part
